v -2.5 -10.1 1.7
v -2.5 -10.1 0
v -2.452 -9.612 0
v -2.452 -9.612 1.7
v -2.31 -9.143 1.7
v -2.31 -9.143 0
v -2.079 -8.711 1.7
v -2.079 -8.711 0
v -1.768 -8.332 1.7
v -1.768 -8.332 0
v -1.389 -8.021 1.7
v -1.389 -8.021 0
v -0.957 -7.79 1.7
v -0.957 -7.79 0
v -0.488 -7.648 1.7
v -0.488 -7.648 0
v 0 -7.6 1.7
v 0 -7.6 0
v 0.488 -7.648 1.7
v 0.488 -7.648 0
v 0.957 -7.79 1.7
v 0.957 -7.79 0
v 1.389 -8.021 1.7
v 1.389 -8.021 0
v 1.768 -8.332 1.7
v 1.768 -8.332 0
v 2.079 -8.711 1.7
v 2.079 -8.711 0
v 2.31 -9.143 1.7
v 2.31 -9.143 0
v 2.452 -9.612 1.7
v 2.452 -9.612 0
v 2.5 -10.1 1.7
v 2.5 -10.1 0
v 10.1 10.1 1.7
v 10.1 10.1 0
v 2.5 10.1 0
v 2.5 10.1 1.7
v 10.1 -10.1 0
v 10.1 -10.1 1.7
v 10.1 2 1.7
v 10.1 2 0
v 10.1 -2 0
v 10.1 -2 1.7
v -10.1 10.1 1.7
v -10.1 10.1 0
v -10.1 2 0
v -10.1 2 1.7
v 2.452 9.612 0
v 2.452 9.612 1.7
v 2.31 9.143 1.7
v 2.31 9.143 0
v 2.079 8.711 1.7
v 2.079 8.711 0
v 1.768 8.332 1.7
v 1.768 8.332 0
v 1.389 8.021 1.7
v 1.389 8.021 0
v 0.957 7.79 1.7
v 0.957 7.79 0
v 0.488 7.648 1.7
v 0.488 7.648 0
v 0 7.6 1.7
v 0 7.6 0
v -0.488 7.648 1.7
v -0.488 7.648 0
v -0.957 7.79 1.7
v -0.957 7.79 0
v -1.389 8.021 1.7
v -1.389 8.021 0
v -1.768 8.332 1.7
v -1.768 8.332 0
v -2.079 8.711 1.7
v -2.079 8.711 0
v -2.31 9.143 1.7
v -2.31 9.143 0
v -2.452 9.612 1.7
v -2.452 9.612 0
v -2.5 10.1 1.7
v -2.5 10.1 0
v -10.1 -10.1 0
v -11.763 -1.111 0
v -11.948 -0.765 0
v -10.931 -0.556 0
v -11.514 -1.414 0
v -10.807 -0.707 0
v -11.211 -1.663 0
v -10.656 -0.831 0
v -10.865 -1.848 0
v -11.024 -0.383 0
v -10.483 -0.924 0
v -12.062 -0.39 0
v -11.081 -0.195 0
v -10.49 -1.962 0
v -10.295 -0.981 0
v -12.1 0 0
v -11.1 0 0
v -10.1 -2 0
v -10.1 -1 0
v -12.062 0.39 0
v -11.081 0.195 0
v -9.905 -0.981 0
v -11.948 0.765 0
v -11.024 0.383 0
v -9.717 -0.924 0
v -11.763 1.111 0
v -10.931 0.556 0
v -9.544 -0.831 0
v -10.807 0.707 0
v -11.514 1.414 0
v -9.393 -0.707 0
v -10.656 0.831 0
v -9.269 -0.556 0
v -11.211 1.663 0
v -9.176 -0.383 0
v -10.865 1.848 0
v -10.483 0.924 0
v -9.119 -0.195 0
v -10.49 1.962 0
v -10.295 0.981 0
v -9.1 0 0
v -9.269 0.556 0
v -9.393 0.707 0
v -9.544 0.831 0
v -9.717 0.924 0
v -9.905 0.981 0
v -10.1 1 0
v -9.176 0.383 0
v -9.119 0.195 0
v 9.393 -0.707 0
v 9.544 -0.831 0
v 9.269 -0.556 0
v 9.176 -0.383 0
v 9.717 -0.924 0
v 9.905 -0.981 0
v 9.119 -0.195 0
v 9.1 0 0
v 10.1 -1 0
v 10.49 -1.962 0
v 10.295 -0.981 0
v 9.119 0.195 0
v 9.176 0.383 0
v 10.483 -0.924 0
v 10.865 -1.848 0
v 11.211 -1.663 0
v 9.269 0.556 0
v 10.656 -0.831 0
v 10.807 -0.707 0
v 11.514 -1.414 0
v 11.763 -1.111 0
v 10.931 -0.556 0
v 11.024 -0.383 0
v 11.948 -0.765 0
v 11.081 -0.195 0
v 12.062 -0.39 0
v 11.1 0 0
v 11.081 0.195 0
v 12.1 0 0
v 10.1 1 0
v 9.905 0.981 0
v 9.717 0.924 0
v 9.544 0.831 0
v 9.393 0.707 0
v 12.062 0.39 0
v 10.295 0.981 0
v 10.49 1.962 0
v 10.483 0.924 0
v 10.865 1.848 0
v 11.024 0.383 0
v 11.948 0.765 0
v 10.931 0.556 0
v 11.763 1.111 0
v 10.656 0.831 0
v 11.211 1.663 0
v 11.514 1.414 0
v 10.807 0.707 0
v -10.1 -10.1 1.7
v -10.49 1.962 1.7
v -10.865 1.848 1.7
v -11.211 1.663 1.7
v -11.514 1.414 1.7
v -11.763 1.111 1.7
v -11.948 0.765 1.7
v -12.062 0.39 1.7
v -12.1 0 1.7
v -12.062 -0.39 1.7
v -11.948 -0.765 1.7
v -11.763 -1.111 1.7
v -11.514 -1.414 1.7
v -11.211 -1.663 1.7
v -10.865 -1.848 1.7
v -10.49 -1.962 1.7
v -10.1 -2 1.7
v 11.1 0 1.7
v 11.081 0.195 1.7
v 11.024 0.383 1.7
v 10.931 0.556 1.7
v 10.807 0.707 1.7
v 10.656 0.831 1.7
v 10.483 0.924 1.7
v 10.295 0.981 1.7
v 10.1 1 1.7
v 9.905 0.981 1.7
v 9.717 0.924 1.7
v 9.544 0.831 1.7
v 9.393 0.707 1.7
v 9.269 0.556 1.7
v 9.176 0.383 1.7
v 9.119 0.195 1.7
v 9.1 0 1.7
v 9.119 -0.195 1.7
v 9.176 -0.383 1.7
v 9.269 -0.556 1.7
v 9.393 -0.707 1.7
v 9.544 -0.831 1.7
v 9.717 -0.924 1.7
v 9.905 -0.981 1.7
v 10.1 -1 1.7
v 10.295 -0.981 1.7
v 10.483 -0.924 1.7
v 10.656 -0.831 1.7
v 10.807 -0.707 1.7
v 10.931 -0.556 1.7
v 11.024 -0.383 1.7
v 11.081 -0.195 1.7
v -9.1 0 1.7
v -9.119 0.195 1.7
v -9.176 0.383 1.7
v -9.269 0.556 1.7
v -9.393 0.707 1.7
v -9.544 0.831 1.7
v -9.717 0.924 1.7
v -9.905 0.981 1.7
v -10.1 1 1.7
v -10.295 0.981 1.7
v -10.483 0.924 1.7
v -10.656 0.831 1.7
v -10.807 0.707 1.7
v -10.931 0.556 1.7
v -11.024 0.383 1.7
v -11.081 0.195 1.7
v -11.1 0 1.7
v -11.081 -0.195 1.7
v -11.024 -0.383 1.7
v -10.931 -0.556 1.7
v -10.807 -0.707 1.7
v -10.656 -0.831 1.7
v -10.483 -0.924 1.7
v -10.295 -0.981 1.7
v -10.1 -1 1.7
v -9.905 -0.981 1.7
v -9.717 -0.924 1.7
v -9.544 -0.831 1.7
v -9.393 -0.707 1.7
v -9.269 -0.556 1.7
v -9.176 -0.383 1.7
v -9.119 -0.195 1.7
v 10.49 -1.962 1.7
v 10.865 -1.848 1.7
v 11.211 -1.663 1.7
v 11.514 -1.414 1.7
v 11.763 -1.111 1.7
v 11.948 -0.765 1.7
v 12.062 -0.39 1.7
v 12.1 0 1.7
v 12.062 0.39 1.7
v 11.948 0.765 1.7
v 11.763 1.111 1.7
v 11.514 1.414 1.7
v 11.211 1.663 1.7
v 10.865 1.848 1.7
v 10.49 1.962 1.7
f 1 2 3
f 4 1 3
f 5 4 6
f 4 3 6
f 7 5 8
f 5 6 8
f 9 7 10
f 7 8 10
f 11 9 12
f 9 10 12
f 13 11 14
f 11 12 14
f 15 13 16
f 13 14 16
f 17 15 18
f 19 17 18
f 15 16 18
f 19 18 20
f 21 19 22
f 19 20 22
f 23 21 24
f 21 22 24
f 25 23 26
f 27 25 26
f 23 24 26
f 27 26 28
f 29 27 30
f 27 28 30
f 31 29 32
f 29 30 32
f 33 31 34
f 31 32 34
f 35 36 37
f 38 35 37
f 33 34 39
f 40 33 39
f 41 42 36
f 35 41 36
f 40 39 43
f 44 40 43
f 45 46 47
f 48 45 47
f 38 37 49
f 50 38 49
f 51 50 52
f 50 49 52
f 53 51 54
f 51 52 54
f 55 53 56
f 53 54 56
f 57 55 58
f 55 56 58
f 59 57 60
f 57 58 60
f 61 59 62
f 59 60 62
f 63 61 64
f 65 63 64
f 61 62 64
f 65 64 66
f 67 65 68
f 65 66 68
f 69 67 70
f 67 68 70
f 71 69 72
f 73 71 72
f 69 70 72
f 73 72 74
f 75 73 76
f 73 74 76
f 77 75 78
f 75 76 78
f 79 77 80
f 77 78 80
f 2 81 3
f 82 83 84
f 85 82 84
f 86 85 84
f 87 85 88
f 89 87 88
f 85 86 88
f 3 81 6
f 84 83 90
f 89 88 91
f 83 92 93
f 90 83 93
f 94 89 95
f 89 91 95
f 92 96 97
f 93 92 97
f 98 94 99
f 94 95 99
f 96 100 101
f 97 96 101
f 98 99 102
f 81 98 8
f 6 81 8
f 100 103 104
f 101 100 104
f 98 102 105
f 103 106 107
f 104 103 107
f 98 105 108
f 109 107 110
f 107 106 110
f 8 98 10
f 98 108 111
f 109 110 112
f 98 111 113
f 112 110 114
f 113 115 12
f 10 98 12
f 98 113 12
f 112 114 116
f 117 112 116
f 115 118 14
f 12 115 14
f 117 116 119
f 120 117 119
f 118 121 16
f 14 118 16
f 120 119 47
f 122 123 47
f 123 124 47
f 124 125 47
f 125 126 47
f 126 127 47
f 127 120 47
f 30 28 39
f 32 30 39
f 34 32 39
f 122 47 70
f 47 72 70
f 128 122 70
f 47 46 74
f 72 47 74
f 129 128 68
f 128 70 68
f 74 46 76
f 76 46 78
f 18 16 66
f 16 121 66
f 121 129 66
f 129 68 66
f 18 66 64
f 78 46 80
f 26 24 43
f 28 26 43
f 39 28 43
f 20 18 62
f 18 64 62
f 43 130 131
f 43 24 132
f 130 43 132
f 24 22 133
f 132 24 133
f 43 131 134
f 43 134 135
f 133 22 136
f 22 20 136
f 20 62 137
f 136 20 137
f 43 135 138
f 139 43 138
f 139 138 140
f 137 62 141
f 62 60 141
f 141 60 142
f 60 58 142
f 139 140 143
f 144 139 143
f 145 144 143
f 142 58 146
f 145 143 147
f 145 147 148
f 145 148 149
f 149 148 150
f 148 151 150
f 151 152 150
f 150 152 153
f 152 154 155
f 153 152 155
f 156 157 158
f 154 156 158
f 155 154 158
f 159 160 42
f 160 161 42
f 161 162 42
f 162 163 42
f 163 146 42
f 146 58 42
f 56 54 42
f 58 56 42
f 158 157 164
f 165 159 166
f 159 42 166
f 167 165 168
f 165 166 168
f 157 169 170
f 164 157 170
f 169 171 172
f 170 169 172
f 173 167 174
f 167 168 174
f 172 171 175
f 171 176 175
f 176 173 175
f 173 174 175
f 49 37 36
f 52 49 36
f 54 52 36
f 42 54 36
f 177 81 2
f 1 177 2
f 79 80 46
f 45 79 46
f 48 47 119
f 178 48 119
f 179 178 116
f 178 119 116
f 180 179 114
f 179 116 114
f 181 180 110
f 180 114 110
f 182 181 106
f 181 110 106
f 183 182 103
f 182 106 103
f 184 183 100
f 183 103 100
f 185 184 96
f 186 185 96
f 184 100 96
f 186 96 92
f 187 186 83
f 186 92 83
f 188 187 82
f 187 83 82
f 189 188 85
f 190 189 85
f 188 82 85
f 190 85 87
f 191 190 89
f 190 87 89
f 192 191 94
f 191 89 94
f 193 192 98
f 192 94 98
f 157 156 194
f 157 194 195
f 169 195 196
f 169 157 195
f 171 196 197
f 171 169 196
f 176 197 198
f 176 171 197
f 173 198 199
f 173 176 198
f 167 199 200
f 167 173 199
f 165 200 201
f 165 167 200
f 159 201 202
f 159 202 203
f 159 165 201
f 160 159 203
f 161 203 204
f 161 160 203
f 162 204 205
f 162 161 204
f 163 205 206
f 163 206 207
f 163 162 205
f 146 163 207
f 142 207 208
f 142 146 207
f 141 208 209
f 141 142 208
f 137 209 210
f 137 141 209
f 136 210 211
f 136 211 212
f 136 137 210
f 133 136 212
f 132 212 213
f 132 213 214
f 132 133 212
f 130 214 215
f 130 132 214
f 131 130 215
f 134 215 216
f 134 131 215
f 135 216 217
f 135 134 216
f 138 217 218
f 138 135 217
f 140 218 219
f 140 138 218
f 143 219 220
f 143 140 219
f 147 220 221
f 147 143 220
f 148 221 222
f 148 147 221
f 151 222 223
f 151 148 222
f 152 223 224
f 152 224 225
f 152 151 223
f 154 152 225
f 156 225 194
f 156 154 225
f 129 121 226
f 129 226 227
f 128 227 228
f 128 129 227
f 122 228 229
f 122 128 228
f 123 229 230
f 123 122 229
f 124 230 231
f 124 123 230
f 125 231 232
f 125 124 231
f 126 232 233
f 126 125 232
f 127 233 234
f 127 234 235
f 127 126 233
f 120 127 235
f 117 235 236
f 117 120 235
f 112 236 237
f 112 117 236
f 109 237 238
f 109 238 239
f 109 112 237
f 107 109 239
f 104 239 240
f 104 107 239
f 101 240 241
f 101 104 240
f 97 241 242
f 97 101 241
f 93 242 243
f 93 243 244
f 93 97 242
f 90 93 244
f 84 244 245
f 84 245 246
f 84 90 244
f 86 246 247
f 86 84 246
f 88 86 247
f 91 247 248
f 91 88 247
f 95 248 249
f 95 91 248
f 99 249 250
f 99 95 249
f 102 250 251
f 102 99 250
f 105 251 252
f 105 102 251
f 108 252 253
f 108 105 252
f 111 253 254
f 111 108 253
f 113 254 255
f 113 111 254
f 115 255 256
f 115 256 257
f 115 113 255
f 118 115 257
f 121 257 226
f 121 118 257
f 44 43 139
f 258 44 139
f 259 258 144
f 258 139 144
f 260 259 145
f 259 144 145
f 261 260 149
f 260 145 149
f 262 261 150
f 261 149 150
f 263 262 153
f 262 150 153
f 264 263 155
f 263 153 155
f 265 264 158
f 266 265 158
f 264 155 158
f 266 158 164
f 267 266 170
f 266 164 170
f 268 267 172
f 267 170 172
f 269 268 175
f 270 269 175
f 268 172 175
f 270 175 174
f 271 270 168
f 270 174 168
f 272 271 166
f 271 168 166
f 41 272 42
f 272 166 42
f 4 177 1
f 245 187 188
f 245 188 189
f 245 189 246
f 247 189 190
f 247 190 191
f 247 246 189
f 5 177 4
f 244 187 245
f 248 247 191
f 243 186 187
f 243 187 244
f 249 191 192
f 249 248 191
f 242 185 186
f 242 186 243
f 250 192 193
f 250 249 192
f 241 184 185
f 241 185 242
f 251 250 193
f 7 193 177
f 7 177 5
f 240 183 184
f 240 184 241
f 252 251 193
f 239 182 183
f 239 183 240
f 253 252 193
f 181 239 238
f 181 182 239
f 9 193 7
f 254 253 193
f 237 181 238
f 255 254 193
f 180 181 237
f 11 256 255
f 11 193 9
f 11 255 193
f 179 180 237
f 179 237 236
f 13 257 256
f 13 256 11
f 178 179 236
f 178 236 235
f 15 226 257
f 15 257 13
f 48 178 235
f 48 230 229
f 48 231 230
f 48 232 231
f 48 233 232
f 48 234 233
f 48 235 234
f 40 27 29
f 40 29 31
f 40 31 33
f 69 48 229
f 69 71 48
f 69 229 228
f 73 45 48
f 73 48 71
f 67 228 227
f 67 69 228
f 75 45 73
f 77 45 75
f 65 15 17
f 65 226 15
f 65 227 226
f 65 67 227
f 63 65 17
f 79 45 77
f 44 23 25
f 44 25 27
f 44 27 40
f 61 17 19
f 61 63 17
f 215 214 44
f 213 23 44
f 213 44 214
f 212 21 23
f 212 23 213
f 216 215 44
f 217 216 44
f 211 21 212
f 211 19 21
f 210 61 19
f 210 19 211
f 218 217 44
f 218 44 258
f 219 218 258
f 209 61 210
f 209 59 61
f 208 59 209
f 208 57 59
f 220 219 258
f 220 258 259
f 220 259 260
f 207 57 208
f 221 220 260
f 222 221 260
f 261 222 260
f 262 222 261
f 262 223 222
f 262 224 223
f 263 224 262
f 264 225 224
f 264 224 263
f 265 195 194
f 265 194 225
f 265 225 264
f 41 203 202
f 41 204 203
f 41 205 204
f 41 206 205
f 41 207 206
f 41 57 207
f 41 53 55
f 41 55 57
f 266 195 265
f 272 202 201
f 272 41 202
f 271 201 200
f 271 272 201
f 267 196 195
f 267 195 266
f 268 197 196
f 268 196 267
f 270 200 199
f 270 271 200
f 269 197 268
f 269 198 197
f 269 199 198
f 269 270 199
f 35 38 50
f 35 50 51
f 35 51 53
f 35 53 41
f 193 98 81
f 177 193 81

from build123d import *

# Parameters (mm, degrees)
CROQUIS1_R              = 1
SALIENTE_EXTRUIR1_DEPTH = 1.7


with BuildPart() as part:
    # Croquis1 → Saliente-Extruir1 (new body)
    with BuildSketch(Plane.XY):
        with BuildLine():
            Line((-2.5, 10.1), (-10.1, 10.1))
            Line((-10.1, 10.1), (-10.1, 2))
            ThreePointArc((-10.1, 2), (-12.1, 0), (-10.1, -2))
            Line((-10.1, -2), (-10.1, -10.1))
            Line((-10.1, -10.1), (-2.5, -10.1))
            ThreePointArc((-2.5, -10.1), (0, -7.6), (2.5, -10.1))
            Line((2.5, -10.1), (10.1, -10.1))
            Line((10.1, -10.1), (10.1, -2))
            ThreePointArc((10.1, -2), (12.1, 0), (10.1, 2))
            Line((10.1, 2), (10.1, 10.1))
            Line((10.1, 10.1), (2.5, 10.1))
            ThreePointArc((2.5, 10.1), (0, 7.6), (-2.5, 10.1))
        make_face()
        with Locations((-10.1, 0)):
            Circle(CROQUIS1_R, mode=Mode.SUBTRACT)
        with Locations((10.1, 0)):
            Circle(CROQUIS1_R, mode=Mode.SUBTRACT)
    extrude(amount=SALIENTE_EXTRUIR1_DEPTH)


solid = part.part
